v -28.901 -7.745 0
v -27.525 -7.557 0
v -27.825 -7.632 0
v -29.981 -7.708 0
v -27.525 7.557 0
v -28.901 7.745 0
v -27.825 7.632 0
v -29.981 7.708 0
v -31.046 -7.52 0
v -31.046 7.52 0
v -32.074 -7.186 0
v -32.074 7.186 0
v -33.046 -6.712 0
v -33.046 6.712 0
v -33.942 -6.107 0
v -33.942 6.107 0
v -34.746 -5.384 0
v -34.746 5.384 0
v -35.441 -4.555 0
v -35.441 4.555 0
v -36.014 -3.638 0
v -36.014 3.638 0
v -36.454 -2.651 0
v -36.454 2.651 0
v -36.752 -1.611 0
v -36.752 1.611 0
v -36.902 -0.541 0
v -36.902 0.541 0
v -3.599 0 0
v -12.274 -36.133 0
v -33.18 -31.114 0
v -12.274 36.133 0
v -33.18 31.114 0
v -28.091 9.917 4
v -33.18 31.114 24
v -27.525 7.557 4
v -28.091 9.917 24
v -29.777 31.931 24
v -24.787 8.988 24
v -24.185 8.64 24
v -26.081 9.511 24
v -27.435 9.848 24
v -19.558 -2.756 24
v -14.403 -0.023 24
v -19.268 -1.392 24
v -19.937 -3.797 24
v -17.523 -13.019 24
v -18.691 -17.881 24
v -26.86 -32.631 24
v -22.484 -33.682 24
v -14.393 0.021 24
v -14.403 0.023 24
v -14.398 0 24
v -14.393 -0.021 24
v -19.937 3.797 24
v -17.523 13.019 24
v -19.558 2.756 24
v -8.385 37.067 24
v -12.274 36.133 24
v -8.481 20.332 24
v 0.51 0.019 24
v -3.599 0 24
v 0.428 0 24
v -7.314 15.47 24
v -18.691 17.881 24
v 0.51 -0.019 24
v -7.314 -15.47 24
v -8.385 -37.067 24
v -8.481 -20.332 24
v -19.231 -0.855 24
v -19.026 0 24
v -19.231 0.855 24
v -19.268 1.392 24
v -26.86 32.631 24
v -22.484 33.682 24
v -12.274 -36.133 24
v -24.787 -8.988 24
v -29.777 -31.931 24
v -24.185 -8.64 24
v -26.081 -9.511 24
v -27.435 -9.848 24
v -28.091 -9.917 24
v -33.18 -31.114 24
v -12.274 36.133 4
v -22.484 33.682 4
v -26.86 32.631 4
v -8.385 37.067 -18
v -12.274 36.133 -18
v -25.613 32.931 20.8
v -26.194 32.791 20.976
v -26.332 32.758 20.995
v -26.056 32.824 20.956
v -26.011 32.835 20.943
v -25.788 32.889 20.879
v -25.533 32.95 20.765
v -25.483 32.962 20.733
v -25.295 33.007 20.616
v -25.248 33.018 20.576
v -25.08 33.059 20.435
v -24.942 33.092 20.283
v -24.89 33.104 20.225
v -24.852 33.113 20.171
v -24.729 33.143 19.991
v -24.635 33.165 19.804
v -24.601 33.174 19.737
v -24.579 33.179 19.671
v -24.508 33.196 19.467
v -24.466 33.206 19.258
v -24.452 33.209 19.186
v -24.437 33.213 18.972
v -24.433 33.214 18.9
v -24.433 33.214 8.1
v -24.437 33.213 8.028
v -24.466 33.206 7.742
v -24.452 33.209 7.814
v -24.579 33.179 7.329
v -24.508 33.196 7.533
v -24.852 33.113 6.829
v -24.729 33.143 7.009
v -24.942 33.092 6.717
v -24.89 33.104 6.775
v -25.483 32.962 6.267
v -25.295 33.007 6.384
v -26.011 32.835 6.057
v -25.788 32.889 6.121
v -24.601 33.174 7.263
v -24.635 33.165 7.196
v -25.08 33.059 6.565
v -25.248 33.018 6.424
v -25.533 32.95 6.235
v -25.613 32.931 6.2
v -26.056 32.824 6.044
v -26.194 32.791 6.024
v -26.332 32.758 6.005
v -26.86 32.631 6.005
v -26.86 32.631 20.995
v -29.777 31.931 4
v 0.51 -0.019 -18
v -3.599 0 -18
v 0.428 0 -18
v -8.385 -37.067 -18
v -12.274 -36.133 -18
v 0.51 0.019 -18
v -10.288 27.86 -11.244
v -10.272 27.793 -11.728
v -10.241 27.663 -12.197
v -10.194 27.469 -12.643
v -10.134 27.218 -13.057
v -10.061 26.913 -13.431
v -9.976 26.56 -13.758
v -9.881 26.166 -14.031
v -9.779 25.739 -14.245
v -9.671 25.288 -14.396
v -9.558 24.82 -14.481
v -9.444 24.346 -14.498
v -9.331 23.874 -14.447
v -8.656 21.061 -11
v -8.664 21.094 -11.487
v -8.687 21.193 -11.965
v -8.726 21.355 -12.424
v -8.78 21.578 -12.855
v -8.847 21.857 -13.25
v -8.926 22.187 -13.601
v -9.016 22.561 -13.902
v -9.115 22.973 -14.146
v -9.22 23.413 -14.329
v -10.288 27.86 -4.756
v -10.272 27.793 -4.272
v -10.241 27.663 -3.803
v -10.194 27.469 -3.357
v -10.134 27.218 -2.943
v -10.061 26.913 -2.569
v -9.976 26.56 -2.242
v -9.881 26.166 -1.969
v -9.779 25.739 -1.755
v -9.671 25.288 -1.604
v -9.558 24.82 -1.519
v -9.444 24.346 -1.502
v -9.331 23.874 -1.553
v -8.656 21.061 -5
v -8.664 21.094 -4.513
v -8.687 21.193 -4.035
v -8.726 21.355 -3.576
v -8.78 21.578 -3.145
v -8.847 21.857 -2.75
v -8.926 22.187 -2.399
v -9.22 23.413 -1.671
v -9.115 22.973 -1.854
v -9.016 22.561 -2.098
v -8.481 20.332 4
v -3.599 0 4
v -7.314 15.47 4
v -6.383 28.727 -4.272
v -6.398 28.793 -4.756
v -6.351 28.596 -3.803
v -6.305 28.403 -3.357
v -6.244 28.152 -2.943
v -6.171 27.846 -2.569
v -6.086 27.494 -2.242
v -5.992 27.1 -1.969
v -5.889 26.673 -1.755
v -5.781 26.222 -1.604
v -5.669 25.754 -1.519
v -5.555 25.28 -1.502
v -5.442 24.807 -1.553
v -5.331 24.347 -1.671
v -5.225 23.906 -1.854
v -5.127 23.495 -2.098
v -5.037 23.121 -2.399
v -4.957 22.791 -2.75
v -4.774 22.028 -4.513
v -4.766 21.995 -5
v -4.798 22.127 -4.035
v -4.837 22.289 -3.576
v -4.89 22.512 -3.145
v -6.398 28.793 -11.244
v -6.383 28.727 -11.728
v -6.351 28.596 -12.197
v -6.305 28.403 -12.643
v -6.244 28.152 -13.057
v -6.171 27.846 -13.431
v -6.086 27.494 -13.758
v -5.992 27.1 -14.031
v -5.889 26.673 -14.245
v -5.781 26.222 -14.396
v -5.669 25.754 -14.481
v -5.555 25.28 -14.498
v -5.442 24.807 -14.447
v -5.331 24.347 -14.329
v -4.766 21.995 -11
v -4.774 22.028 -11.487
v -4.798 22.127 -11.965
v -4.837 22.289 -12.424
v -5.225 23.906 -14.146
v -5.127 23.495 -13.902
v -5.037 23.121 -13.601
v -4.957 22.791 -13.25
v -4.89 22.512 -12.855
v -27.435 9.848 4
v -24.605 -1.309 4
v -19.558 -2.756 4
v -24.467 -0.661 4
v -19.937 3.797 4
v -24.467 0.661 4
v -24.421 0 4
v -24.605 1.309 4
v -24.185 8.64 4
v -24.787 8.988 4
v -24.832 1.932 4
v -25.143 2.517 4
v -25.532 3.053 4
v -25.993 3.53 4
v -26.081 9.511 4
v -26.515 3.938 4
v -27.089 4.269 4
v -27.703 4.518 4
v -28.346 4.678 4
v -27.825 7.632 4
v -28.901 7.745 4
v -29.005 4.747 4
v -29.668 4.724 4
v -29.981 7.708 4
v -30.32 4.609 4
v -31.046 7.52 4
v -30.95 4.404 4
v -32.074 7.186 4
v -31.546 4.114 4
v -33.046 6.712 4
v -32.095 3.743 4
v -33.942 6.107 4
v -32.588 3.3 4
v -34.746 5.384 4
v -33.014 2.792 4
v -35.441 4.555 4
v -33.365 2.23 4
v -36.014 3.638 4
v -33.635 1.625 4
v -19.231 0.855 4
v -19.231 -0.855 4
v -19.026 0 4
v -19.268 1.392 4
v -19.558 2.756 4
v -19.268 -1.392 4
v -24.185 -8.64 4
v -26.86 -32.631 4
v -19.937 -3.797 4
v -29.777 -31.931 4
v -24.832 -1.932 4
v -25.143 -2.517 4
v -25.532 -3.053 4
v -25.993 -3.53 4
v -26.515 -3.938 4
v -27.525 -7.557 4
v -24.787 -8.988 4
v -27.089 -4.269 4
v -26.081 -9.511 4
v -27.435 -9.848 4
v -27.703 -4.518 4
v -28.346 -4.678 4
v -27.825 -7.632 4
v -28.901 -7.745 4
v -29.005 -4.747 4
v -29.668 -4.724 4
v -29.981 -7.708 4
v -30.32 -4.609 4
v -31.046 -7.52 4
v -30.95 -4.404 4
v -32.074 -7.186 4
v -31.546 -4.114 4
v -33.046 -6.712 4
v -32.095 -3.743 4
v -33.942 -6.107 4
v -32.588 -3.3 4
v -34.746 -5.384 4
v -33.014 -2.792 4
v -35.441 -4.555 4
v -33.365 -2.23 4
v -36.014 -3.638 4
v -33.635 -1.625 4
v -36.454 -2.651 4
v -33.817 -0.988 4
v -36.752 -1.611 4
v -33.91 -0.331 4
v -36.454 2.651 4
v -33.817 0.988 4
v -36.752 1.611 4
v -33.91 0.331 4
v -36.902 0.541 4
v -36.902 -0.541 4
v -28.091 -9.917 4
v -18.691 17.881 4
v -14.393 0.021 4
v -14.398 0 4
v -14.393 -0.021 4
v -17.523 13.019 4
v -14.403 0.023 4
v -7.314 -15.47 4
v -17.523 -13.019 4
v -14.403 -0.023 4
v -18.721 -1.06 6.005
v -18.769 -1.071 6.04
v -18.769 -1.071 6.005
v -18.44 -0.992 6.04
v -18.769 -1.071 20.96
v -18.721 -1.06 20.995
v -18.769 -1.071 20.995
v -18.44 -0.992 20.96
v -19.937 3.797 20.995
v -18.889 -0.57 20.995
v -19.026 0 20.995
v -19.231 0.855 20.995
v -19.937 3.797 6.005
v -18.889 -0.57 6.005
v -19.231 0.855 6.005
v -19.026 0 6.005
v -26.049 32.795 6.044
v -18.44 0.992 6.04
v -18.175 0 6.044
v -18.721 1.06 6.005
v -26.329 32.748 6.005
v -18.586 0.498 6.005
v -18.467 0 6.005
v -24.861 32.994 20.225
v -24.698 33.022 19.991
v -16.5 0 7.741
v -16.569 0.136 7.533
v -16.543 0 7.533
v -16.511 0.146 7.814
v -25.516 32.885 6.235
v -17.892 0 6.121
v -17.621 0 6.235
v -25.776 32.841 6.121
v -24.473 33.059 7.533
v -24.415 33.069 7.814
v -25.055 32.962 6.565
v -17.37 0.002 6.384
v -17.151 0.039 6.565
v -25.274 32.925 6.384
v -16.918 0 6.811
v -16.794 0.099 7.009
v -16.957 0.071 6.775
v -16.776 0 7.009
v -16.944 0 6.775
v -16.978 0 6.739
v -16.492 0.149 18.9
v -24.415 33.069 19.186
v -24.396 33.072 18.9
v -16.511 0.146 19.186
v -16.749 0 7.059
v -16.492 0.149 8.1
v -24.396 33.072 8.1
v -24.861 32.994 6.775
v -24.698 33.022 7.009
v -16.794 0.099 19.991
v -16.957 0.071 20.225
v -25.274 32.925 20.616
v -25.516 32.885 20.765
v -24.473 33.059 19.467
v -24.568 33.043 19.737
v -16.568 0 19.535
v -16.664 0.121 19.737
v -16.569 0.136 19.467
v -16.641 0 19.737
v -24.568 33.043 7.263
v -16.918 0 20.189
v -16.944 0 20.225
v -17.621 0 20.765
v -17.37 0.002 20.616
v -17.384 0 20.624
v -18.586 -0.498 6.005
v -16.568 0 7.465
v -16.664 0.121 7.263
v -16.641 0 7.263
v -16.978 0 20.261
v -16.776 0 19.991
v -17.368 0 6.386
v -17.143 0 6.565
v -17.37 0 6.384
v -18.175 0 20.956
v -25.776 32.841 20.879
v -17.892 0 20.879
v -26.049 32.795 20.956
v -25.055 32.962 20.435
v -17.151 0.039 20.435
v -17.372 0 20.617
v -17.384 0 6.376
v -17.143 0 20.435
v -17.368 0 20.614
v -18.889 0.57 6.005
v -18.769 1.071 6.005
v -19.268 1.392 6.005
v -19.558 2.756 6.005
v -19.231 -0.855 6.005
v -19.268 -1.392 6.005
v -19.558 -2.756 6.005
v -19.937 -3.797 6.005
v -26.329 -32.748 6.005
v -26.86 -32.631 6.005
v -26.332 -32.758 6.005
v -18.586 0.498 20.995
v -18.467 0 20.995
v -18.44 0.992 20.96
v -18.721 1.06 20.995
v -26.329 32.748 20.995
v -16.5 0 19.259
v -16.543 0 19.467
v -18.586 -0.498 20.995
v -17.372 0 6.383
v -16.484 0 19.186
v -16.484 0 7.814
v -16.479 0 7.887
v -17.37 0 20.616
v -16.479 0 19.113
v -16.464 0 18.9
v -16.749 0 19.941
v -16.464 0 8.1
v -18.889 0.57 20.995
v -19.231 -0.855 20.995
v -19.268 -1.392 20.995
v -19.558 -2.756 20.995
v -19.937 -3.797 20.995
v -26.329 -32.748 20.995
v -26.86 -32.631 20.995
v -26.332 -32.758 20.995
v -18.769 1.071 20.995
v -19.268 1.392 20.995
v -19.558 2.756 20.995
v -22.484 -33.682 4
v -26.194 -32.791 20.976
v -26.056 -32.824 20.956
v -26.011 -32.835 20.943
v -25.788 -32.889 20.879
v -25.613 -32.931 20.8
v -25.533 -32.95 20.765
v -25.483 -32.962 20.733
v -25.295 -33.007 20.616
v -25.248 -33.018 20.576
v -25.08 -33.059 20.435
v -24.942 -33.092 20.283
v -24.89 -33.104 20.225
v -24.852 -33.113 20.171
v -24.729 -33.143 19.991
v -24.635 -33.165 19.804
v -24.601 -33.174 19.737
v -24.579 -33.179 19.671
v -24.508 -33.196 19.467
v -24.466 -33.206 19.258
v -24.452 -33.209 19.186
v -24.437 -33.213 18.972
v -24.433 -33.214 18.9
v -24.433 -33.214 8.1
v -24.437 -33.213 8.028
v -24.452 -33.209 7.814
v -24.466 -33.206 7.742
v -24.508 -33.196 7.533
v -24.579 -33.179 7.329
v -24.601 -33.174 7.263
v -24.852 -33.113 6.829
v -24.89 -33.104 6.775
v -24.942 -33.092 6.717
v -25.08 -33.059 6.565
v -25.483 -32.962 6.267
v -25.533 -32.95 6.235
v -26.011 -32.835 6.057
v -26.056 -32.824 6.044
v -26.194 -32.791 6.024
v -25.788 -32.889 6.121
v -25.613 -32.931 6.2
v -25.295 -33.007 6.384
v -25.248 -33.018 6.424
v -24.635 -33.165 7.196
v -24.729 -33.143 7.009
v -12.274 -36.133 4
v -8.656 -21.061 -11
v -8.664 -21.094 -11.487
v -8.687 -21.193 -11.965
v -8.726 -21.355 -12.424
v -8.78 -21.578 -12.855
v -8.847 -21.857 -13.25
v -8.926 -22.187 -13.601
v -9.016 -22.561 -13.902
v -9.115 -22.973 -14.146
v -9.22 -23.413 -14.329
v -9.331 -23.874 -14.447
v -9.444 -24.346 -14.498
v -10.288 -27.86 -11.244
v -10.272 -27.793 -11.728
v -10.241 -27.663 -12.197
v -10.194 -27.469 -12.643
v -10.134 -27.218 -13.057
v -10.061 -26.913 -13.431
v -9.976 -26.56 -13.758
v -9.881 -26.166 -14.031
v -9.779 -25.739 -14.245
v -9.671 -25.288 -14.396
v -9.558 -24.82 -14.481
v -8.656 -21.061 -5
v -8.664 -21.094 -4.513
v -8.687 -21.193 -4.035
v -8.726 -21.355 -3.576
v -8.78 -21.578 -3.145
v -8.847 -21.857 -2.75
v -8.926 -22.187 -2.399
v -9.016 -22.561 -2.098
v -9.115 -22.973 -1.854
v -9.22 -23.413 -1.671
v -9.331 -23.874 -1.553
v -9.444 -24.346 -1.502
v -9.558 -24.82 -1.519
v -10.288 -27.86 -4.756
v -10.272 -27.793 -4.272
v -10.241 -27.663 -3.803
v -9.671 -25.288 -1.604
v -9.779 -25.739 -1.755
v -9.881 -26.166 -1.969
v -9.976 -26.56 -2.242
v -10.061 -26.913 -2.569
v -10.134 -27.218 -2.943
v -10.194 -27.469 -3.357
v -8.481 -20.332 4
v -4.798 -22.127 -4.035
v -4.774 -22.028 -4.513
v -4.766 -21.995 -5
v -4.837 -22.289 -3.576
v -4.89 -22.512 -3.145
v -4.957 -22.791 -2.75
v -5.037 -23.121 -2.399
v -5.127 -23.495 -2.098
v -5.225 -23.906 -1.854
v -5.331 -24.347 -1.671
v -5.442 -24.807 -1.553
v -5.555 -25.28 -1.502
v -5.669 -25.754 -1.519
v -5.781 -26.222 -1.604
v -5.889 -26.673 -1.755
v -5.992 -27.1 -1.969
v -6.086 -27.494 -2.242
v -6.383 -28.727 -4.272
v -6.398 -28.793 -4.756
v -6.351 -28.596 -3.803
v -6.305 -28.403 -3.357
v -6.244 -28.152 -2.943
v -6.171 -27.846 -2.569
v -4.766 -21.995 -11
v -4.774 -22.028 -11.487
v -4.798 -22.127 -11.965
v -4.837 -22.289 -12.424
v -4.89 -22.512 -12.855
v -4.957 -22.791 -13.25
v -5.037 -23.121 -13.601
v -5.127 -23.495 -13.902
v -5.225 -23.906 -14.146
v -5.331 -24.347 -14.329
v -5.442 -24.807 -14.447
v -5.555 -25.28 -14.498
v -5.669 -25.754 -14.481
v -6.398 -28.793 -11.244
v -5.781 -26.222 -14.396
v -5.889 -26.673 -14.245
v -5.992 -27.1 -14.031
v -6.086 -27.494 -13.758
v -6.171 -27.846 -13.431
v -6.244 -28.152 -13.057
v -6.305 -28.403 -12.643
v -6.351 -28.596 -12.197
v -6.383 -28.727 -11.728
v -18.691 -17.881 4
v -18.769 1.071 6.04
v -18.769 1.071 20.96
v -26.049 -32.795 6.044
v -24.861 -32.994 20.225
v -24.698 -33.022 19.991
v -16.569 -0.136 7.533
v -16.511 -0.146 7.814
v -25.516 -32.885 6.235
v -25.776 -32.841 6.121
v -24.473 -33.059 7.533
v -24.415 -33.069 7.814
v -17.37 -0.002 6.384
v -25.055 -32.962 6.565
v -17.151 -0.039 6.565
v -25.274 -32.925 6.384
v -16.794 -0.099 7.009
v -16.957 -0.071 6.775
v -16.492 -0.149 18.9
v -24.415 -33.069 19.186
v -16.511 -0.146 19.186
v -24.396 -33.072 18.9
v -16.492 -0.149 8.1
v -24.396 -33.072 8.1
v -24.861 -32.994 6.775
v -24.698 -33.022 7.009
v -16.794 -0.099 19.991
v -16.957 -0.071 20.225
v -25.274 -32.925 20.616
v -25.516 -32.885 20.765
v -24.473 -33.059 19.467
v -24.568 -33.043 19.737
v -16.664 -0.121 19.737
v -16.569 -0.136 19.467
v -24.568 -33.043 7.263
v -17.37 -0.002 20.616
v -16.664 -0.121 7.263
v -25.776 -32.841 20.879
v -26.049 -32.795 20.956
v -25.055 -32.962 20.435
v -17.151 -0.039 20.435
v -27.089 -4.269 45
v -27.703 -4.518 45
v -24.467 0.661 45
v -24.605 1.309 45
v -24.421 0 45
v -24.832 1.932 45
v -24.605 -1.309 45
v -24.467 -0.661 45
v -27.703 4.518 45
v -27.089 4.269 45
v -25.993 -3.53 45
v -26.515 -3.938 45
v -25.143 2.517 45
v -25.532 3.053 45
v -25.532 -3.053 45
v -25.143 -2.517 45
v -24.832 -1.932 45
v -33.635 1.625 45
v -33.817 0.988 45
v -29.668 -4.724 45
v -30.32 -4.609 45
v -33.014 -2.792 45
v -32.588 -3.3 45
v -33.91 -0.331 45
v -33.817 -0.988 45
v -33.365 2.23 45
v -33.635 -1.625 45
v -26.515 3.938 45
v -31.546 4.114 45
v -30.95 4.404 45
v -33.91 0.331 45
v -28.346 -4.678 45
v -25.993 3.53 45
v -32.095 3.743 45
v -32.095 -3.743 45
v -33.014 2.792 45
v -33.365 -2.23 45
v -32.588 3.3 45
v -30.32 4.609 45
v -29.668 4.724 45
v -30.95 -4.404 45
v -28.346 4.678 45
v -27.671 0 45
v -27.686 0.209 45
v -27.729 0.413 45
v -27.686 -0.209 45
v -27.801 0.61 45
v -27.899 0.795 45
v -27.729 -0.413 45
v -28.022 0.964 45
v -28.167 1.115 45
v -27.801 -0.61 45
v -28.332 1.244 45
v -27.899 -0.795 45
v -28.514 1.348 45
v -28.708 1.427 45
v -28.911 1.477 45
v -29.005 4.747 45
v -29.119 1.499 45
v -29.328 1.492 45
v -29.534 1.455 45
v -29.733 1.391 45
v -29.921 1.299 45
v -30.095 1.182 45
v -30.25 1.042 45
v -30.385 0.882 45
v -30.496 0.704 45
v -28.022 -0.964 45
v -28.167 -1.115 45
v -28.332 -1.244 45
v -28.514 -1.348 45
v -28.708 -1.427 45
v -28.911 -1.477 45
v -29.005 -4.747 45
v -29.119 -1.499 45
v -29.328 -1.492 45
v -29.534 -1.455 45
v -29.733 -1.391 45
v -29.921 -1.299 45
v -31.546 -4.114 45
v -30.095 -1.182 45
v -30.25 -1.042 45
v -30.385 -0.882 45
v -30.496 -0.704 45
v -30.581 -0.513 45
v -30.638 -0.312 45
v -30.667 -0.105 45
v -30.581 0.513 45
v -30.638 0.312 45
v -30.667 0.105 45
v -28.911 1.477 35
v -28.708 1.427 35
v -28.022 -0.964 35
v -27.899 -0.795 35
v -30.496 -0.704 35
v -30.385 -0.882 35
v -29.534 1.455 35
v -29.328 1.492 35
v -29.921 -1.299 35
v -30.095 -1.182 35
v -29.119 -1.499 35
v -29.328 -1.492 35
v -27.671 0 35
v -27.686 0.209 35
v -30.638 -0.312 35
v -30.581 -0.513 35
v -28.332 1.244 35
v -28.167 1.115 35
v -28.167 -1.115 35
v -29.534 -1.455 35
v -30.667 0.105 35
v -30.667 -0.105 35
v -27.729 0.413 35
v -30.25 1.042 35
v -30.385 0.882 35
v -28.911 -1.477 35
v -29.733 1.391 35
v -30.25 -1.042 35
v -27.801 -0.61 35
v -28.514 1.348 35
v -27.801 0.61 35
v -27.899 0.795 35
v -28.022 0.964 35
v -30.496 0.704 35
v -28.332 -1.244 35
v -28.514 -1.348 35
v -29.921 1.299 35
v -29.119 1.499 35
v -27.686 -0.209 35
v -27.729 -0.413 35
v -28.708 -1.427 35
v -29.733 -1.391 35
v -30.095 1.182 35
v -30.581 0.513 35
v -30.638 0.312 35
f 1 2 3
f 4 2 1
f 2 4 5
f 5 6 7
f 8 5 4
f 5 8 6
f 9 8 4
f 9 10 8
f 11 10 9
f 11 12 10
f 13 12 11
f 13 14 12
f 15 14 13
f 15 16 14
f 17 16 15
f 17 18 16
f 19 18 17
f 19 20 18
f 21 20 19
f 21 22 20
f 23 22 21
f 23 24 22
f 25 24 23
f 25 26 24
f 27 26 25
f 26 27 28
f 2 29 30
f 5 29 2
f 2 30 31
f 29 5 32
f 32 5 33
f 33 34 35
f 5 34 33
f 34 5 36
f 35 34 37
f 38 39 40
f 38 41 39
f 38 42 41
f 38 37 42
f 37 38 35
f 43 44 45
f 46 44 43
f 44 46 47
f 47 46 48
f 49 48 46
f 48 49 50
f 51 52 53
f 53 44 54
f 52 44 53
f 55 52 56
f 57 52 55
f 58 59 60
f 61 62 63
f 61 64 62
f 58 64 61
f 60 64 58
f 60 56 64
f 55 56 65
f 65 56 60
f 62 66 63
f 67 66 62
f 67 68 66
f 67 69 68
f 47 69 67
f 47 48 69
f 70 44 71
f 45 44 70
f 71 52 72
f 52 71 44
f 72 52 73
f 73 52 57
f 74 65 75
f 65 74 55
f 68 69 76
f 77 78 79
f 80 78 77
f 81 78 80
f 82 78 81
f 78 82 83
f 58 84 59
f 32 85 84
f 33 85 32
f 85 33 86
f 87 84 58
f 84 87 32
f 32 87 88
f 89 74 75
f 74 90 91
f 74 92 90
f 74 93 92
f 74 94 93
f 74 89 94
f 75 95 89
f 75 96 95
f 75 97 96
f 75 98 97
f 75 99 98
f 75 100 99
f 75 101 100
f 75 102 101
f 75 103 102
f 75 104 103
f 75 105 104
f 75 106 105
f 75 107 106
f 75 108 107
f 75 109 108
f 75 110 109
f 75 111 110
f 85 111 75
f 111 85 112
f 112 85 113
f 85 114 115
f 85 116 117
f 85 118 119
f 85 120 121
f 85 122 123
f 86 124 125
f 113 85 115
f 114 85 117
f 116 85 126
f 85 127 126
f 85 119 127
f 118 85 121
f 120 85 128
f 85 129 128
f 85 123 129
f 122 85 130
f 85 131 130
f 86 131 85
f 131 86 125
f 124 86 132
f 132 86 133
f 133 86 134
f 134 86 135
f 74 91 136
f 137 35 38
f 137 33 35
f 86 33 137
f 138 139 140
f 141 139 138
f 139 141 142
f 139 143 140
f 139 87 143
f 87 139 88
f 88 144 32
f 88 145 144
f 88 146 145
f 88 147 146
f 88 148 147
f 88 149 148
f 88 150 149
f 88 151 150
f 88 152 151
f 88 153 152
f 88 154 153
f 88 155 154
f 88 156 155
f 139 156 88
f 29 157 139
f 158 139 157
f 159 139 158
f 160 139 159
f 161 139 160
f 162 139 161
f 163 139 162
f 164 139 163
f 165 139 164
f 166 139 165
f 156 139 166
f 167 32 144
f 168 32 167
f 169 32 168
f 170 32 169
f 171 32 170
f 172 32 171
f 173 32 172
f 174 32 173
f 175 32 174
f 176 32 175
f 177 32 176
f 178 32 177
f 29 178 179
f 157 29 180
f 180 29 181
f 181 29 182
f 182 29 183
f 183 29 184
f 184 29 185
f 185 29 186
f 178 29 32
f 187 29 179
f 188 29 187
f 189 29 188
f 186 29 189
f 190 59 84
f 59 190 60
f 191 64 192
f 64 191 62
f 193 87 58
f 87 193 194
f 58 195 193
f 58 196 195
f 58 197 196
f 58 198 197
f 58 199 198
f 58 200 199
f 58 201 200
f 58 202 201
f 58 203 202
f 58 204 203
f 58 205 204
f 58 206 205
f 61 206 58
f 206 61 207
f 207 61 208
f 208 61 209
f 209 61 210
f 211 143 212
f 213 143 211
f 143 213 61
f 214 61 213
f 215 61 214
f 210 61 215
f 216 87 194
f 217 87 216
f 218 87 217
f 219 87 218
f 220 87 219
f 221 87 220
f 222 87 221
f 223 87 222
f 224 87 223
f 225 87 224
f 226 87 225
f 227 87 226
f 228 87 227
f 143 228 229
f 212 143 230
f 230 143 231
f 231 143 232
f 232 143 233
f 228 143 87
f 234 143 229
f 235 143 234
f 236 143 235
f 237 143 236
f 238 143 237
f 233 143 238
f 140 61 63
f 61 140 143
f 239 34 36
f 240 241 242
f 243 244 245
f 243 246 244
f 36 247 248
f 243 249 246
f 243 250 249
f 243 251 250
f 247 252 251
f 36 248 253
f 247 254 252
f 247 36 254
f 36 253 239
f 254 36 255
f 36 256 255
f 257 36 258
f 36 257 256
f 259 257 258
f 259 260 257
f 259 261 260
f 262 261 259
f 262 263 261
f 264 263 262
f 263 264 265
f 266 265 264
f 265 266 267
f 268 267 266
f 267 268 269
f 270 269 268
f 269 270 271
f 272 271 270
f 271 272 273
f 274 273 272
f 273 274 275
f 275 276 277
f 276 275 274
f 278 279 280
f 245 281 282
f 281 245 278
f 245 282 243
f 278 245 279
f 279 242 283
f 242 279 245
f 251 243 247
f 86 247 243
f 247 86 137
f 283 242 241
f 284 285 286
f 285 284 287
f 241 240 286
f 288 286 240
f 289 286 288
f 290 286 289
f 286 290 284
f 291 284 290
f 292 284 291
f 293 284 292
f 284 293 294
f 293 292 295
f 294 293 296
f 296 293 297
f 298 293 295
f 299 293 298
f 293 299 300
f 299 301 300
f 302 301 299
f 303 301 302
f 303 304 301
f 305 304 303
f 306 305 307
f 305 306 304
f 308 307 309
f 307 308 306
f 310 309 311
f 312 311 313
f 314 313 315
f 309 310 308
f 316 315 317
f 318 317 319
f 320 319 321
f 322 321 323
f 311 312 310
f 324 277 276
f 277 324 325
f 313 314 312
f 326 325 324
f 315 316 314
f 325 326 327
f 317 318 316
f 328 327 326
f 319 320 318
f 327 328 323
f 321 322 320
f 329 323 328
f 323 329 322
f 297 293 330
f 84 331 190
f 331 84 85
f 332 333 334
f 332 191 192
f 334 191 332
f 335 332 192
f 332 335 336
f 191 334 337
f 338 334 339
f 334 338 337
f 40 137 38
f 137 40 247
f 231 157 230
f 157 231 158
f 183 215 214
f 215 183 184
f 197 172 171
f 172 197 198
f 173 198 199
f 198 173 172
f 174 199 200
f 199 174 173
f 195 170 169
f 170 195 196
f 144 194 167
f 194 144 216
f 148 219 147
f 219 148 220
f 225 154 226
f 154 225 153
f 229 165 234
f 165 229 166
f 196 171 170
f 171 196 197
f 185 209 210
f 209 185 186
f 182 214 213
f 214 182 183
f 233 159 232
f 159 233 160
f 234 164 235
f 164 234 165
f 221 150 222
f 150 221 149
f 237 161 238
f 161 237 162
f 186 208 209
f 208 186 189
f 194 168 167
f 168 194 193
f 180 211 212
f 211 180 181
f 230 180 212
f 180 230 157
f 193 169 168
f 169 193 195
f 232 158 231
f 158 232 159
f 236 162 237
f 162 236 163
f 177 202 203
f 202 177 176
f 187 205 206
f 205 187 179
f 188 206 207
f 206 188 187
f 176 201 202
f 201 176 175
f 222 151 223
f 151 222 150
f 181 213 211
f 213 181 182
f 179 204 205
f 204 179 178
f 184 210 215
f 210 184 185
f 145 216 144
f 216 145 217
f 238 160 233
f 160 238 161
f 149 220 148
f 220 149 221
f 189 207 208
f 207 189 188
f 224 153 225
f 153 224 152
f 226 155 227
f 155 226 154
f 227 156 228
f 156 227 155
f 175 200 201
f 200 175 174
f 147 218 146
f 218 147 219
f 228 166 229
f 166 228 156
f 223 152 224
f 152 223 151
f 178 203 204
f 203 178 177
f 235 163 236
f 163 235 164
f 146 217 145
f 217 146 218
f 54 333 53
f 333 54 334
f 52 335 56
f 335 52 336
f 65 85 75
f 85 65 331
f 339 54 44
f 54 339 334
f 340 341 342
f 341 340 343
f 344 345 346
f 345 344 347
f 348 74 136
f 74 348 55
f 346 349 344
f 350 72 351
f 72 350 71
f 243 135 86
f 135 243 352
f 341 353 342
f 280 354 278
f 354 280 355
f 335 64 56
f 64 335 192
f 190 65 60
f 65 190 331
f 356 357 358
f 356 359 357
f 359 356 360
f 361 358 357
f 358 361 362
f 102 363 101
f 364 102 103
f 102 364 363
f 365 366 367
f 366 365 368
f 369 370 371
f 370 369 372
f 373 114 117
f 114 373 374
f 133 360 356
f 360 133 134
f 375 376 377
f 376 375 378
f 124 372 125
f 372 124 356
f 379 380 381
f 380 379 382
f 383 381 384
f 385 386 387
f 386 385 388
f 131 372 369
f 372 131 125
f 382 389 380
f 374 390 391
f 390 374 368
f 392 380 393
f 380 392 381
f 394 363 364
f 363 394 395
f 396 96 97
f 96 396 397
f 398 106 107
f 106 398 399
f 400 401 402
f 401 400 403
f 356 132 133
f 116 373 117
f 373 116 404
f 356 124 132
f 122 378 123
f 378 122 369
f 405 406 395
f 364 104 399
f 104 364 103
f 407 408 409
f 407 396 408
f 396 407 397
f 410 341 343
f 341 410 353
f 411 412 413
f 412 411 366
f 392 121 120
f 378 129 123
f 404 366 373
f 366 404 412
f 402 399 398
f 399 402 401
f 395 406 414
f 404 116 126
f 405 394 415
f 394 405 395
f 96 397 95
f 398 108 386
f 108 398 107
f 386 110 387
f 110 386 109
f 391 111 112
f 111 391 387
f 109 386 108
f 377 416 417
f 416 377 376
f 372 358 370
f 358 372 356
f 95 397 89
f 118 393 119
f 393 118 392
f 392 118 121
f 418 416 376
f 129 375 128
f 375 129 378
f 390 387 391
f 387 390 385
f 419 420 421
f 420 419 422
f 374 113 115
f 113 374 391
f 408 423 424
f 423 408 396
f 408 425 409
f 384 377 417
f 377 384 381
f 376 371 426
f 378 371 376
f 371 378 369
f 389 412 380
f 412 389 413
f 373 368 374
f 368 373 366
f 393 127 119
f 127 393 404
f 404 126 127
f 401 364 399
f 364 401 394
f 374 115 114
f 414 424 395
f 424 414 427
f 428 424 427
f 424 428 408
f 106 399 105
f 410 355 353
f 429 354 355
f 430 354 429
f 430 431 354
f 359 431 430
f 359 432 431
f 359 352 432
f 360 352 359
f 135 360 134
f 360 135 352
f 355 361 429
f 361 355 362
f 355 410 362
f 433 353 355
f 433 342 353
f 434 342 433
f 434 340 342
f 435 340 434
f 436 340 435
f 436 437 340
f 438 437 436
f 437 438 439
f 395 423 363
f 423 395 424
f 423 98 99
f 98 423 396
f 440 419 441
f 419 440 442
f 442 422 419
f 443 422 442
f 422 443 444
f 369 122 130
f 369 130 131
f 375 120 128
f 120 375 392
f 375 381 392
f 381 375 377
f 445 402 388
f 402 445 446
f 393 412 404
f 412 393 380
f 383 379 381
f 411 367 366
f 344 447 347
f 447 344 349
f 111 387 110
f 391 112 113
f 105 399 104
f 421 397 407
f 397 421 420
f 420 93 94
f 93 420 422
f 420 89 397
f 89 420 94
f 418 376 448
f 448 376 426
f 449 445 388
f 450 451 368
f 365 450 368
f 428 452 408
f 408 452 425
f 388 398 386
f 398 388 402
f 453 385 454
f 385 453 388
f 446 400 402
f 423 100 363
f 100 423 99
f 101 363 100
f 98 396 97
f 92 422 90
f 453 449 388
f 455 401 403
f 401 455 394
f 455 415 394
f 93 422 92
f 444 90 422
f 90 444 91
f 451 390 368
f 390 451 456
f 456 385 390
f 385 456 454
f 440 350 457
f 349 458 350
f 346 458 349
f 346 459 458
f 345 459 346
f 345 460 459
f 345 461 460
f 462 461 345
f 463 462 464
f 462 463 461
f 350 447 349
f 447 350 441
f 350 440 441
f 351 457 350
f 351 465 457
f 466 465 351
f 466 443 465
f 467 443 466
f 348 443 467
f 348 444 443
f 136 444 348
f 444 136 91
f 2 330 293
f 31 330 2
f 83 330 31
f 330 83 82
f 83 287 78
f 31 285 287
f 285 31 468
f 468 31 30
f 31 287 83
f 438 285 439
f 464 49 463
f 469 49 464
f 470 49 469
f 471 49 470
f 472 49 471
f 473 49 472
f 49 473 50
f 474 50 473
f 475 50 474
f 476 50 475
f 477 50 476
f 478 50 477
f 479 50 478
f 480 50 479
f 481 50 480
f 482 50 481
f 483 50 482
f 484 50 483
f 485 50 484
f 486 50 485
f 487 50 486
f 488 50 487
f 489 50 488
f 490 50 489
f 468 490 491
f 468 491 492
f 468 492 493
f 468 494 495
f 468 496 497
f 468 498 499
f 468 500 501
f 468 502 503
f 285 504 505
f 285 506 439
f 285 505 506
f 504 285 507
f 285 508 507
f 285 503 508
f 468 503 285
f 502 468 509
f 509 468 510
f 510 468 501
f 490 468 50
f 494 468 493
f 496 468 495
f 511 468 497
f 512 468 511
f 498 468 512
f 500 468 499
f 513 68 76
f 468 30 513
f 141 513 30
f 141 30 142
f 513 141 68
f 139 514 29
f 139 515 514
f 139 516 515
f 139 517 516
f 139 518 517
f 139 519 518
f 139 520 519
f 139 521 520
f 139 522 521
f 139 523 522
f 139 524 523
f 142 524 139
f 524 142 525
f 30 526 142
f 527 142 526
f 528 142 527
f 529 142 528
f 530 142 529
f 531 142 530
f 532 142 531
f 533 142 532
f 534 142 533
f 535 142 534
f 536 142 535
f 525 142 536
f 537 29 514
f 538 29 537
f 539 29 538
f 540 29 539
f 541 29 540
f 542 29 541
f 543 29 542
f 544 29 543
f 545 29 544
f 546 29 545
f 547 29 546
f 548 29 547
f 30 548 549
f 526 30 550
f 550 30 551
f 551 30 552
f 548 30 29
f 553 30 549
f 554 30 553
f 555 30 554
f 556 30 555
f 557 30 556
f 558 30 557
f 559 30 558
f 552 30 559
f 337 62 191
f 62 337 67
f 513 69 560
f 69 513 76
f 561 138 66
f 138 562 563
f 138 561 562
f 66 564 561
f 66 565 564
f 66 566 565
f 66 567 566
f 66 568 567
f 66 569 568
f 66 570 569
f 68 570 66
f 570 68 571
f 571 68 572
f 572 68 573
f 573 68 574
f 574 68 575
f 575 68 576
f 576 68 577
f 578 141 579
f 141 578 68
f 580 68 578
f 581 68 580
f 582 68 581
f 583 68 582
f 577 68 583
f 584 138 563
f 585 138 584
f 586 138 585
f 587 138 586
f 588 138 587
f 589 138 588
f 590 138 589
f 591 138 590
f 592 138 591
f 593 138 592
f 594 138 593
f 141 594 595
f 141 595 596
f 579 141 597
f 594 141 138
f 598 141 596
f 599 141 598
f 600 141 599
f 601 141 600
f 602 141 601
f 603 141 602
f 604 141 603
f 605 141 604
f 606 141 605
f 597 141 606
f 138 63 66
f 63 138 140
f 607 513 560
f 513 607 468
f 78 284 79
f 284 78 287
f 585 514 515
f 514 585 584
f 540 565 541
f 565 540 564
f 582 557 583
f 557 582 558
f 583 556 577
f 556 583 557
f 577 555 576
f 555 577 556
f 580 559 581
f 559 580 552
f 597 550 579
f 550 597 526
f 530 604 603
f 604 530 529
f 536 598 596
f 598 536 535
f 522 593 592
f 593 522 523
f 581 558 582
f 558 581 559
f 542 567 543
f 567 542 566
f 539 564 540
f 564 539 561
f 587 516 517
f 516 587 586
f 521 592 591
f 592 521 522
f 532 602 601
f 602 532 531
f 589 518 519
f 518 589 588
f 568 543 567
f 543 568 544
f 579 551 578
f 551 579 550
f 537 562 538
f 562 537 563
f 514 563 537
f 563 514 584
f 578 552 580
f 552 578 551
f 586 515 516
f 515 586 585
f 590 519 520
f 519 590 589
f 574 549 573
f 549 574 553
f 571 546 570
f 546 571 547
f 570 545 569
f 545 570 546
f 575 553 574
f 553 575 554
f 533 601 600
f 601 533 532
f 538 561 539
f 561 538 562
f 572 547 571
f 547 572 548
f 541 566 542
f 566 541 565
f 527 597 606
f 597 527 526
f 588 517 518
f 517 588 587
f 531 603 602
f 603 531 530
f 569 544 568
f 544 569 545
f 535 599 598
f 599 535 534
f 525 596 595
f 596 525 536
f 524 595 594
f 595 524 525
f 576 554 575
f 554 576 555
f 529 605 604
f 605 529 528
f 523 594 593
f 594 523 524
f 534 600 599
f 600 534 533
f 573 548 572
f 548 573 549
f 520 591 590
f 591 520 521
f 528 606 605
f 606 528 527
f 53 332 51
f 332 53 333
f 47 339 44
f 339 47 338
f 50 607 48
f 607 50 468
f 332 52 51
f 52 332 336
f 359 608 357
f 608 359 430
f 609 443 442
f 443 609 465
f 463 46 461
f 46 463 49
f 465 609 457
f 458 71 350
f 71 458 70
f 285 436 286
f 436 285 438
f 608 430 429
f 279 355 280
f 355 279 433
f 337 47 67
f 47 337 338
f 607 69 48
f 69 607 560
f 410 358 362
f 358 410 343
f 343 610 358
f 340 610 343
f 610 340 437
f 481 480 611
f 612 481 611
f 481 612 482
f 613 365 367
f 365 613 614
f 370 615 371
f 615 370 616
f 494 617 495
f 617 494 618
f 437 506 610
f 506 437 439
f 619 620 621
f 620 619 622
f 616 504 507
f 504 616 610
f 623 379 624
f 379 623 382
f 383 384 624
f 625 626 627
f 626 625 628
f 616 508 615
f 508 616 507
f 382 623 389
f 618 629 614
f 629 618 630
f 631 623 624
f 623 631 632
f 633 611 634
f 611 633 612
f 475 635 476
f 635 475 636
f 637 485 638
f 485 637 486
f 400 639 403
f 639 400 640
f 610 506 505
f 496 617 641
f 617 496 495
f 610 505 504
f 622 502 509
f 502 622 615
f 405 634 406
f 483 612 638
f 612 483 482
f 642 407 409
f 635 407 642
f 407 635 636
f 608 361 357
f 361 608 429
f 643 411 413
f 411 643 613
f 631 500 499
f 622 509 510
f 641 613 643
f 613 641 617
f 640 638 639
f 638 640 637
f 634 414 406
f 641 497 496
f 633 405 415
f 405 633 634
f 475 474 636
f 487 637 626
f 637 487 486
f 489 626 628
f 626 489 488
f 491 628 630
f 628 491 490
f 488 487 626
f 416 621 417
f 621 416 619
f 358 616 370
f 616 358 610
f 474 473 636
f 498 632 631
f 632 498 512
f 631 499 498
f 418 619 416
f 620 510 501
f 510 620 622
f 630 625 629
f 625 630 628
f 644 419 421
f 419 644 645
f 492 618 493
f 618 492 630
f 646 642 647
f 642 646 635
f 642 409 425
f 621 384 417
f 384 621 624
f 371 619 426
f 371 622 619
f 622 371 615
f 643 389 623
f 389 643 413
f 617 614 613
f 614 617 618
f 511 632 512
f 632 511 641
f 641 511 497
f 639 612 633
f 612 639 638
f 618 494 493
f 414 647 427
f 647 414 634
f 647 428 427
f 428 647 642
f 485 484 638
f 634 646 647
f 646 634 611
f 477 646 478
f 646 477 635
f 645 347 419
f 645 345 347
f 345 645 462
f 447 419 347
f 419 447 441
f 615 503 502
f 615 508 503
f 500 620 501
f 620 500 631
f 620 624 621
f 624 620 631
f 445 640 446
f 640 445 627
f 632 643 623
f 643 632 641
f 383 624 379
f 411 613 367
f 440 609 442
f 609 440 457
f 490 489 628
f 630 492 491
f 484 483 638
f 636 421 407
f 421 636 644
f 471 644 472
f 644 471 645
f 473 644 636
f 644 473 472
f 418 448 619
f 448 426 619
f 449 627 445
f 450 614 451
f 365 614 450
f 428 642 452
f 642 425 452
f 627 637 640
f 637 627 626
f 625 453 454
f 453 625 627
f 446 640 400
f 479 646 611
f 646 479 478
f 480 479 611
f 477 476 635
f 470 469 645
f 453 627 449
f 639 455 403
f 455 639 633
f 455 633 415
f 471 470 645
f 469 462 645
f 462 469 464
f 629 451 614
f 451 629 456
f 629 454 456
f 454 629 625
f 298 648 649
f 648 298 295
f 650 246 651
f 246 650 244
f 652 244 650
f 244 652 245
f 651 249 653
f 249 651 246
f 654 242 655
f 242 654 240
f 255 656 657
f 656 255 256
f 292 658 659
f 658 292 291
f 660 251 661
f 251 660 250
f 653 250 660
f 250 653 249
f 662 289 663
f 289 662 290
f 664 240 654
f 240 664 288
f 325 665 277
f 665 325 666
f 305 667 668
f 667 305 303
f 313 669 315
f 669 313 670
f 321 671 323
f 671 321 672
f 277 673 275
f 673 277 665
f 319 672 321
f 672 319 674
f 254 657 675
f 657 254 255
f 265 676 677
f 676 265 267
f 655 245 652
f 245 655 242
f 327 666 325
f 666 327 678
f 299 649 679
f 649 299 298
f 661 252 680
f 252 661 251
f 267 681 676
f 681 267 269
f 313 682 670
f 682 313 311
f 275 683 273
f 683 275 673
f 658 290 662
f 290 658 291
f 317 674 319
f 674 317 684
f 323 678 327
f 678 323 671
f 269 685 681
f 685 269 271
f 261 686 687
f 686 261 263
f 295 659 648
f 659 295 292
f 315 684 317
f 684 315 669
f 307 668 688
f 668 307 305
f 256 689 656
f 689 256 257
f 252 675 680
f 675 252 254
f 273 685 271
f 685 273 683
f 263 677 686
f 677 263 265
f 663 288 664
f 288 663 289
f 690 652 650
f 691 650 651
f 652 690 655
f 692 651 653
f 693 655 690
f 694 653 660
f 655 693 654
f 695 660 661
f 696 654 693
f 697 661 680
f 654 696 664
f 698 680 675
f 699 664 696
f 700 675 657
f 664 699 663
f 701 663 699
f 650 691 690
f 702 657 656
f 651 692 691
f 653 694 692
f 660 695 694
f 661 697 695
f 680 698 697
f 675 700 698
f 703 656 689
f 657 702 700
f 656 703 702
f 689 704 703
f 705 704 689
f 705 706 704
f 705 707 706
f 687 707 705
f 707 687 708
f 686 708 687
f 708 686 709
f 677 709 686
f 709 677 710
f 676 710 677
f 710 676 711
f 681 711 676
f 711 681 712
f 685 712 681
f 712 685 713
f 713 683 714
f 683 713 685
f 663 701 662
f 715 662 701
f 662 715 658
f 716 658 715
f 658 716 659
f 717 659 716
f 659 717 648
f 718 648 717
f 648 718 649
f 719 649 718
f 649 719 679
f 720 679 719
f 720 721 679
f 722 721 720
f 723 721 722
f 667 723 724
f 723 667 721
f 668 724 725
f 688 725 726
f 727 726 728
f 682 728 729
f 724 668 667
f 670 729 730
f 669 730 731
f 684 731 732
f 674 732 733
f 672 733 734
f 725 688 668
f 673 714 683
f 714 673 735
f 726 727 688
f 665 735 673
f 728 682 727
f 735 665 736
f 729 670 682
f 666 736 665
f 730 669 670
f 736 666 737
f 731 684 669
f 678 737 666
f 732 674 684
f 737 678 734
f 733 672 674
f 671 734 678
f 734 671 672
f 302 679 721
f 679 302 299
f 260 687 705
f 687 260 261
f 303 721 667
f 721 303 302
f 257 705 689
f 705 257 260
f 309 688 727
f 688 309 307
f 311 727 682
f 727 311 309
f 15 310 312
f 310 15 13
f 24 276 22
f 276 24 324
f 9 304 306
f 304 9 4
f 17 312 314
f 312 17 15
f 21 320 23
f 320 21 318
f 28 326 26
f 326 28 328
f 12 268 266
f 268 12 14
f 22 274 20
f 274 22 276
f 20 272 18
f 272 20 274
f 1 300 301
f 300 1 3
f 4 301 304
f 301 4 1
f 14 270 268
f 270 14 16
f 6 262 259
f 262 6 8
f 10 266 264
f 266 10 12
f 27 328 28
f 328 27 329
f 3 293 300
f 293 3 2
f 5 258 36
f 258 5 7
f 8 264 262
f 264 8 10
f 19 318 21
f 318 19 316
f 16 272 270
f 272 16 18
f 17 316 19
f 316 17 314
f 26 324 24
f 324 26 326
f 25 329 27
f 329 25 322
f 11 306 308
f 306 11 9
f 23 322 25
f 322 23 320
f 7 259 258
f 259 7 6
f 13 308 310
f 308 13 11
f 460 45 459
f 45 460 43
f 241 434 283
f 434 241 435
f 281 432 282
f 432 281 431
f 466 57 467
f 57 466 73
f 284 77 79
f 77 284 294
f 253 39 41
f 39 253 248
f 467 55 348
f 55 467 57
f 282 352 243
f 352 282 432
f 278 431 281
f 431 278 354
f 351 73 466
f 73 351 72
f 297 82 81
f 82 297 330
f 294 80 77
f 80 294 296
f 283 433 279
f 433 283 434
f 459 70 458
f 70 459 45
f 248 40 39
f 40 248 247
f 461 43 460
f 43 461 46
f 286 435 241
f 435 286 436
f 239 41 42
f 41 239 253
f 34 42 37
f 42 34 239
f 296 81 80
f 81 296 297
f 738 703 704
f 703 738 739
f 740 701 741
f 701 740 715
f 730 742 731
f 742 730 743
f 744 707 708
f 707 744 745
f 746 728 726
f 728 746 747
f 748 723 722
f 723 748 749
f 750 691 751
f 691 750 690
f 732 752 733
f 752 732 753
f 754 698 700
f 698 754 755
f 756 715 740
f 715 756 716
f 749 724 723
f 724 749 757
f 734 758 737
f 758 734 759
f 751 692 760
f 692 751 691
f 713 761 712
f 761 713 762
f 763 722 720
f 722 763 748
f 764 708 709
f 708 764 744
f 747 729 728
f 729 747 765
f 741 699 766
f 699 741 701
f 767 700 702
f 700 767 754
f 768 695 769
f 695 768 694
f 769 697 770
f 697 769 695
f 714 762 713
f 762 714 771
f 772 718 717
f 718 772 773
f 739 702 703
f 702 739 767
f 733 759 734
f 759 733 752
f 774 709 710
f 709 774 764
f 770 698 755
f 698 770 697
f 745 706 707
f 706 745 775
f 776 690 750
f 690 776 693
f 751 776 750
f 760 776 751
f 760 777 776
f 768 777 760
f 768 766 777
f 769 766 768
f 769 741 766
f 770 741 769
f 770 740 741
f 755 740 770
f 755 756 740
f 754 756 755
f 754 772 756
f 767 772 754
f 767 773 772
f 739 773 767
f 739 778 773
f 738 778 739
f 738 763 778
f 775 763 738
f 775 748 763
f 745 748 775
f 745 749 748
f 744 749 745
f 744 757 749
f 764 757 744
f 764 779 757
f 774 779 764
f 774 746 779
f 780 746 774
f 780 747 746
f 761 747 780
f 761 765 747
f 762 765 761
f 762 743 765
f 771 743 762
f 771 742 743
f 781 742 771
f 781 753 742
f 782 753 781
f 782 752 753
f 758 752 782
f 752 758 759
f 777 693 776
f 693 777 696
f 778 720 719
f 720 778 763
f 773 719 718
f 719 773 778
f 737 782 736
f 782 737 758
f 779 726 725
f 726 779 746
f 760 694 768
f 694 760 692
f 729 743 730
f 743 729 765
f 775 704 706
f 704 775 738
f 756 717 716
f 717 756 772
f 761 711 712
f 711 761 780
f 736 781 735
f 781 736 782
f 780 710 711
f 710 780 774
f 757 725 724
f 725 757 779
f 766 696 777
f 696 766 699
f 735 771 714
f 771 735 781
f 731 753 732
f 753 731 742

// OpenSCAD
$fn = 45;
d_stick = 9.5;
d_cut_stick = 3;
d_wheel = 17;

length_stick = 45;
length_cut_stick = 10;

size_extern = [25, 38, 24];
size_intern = [18, 65, 20];

//alpha = 60.886266849;
alpha = -(180-153);
//alpha = 90;
beta = 0;
s=alpha-2*beta;

coral_d = 4.2;
coral_width = 15;
coral_pos = -3;

pos_hole = (size_intern.x+d_wheel-(size_extern.x-size_intern.x)/2-1.5)*cos(alpha/2);

module small_box() {
    linear_extrude(size_extern.z)
    square([size_extern.x, size_extern.y]);
    translate([
        size_extern.x-(size_extern.x-size_intern.x)/2,
        -0.1,
        +size_extern.z-42
    ])
    linear_extrude(42)
    square([size_extern.z-size_intern.z, size_extern.y+0.1]);
}

module small_cut_box() {
    linear_extrude(size_intern.z)
    square([size_intern.x, size_intern.y]);
}


module body() {
    translate(
        [
        -size_extern.x,
        0,
        0
        ]
    )
    small_box();
}

module cut_body() {
    translate(
        [
        -size_extern.x,
        0,
        0
        ]
    )
    translate(
        [
        (size_extern.x-size_intern.x)/2,
        -10,
        size_extern.z-size_intern.z
        ]
    )
    small_cut_box();
}

module cut_stick() {
    translate(
        [
        -pos_hole,
        0,
        length_stick-10
    ])
    cylinder(h=length_cut_stick, d=d_cut_stick);
}

module stick() {
    translate(
        [
        -pos_hole,
        0,
        0
        ]
    )
    union() {
        cylinder(h=length_stick, d=d_stick);
        cylinder(h=size_extern.z-size_intern.z, d=d_stick+6);
    }
    
}

module wheel() {
    translate(
        [
        -pos_hole,
        0,
        size_extern.z-size_intern.z
        ])
    difference() {
        cylinder(h=20, d=d_wheel+3);
        cylinder(h=length_stick, d=d_stick);
    }
}

module small_hole() {
    #rotate([90, 180, 90])
    hull() {
        translate([0, 22, 0])
        cylinder(h=8, d=7, center=true);
        translate([0, 16, 0])
        cylinder(h=8, d=7, center=true);
    }
}

module large_hole() {
    rotate([0, 90, 0])
    cylinder(h=8, d=6, center=true);
}


module arc() {
    difference() {
        union() {
            linear_extrude(height=size_extern.z)
            translate([size_intern.x-4, 0])
            square([4.5, ((size_extern.y/2)+0.45)*cos(alpha)]);
        
            #linear_extrude(height=size_extern.z)
            translate([0, size_intern.y/8])
            square([size_intern.x, 2.5]);
        }
        
        translate(
            [
            18-2+coral_width-coral_d/2,
            0,
            9+coral_pos
            ]
        )
        rotate(
        [
        0,
        0,
        90
        ]
        )
        coral_cut();
    }
}

module fill_arc() {
    let(
        ex_x=size_extern.x/cos(beta),
        in_x=size_intern.x/cos(beta)
    ) {
        rotate(
            [
            0,
            0,
            180-(s/2)
            ]
        )
        rotate_extrude(angle=s)
        square([ex_x, size_extern.z]);
    }
}

module half_body() {
    rotate(
    [
        0,
        0,
        -alpha/2
    ]
    )
    difference() {
        union() {
            difference() {
                union() {
                    body();
                    linear_extrude(height=size_extern.z)
                    polygon(
                    [
                    [0, 0],
                    [-size_extern.x, 0],
                    [-size_extern.x, -size_extern.x*tan(beta)]
                    ]);
                };
                translate([0, -15, 0])
                cut_body();
            }
        }
        translate([0, size_extern.y-12, size_extern.z-size_intern.z+7])
        small_hole();
    }
    
    rotate(
    [
        0,
        0,
        -alpha/2
    ]
    )
    translate(
            [
            -size_extern.x,
            0,
            0
            ]
        )
    translate([size_extern.x, size_extern.y, 0])
    rotate([0, 0, 180])
    scale([1,2,1])
    arc();
}



module arcf(radius, thick, angle){
	intersection(){
		union(){
			rights = floor(angle/90);
			remain = angle-rights*90;
			if(angle > 90){
				for(i = [0:rights-1]){
					rotate(i*90-(rights-1)*90/2){
						polygon([[0, 0], [radius+thick, (radius+thick)*tan(90/2)], [radius+thick, -(radius+thick)*tan(90/2)]]);
					}
				}
				rotate(-(rights)*90/2)
					polygon([[0, 0], [radius+thick, 0], [radius+thick, -(radius+thick)*tan(remain/2)]]);
				rotate((rights)*90/2)
					polygon([[0, 0], [radius+thick, (radius+thick)*tan(remain/2)], [radius+thick, 0]]);
			}else{
				polygon([[0, 0], [radius+thick, (radius+thick)*tan(angle/2)], [radius+thick, -(radius+thick)*tan(angle/2)]]);
			}
		}
		difference(){
			circle(radius+thick);
			circle(radius);
		}
	}
}



module coral_cut() {
    translate([0, 0, coral_d/2])
    
    minkowski() {
        linear_extrude(height=coral_width-coral_d)
        square([(size_extern.y/2)*cos(alpha), coral_width - coral_d]);
        sphere(d=coral_d);
    }
}

difference() {
    union() {
        half_body();
        mirror([0, 1, 0])
        half_body();
        *fill_arc();
        stick();
        // rotate([0, 0, 180])
        // linear_extrude_fs(height=10);
    };
    #wheel();
    cut_stick();
}
